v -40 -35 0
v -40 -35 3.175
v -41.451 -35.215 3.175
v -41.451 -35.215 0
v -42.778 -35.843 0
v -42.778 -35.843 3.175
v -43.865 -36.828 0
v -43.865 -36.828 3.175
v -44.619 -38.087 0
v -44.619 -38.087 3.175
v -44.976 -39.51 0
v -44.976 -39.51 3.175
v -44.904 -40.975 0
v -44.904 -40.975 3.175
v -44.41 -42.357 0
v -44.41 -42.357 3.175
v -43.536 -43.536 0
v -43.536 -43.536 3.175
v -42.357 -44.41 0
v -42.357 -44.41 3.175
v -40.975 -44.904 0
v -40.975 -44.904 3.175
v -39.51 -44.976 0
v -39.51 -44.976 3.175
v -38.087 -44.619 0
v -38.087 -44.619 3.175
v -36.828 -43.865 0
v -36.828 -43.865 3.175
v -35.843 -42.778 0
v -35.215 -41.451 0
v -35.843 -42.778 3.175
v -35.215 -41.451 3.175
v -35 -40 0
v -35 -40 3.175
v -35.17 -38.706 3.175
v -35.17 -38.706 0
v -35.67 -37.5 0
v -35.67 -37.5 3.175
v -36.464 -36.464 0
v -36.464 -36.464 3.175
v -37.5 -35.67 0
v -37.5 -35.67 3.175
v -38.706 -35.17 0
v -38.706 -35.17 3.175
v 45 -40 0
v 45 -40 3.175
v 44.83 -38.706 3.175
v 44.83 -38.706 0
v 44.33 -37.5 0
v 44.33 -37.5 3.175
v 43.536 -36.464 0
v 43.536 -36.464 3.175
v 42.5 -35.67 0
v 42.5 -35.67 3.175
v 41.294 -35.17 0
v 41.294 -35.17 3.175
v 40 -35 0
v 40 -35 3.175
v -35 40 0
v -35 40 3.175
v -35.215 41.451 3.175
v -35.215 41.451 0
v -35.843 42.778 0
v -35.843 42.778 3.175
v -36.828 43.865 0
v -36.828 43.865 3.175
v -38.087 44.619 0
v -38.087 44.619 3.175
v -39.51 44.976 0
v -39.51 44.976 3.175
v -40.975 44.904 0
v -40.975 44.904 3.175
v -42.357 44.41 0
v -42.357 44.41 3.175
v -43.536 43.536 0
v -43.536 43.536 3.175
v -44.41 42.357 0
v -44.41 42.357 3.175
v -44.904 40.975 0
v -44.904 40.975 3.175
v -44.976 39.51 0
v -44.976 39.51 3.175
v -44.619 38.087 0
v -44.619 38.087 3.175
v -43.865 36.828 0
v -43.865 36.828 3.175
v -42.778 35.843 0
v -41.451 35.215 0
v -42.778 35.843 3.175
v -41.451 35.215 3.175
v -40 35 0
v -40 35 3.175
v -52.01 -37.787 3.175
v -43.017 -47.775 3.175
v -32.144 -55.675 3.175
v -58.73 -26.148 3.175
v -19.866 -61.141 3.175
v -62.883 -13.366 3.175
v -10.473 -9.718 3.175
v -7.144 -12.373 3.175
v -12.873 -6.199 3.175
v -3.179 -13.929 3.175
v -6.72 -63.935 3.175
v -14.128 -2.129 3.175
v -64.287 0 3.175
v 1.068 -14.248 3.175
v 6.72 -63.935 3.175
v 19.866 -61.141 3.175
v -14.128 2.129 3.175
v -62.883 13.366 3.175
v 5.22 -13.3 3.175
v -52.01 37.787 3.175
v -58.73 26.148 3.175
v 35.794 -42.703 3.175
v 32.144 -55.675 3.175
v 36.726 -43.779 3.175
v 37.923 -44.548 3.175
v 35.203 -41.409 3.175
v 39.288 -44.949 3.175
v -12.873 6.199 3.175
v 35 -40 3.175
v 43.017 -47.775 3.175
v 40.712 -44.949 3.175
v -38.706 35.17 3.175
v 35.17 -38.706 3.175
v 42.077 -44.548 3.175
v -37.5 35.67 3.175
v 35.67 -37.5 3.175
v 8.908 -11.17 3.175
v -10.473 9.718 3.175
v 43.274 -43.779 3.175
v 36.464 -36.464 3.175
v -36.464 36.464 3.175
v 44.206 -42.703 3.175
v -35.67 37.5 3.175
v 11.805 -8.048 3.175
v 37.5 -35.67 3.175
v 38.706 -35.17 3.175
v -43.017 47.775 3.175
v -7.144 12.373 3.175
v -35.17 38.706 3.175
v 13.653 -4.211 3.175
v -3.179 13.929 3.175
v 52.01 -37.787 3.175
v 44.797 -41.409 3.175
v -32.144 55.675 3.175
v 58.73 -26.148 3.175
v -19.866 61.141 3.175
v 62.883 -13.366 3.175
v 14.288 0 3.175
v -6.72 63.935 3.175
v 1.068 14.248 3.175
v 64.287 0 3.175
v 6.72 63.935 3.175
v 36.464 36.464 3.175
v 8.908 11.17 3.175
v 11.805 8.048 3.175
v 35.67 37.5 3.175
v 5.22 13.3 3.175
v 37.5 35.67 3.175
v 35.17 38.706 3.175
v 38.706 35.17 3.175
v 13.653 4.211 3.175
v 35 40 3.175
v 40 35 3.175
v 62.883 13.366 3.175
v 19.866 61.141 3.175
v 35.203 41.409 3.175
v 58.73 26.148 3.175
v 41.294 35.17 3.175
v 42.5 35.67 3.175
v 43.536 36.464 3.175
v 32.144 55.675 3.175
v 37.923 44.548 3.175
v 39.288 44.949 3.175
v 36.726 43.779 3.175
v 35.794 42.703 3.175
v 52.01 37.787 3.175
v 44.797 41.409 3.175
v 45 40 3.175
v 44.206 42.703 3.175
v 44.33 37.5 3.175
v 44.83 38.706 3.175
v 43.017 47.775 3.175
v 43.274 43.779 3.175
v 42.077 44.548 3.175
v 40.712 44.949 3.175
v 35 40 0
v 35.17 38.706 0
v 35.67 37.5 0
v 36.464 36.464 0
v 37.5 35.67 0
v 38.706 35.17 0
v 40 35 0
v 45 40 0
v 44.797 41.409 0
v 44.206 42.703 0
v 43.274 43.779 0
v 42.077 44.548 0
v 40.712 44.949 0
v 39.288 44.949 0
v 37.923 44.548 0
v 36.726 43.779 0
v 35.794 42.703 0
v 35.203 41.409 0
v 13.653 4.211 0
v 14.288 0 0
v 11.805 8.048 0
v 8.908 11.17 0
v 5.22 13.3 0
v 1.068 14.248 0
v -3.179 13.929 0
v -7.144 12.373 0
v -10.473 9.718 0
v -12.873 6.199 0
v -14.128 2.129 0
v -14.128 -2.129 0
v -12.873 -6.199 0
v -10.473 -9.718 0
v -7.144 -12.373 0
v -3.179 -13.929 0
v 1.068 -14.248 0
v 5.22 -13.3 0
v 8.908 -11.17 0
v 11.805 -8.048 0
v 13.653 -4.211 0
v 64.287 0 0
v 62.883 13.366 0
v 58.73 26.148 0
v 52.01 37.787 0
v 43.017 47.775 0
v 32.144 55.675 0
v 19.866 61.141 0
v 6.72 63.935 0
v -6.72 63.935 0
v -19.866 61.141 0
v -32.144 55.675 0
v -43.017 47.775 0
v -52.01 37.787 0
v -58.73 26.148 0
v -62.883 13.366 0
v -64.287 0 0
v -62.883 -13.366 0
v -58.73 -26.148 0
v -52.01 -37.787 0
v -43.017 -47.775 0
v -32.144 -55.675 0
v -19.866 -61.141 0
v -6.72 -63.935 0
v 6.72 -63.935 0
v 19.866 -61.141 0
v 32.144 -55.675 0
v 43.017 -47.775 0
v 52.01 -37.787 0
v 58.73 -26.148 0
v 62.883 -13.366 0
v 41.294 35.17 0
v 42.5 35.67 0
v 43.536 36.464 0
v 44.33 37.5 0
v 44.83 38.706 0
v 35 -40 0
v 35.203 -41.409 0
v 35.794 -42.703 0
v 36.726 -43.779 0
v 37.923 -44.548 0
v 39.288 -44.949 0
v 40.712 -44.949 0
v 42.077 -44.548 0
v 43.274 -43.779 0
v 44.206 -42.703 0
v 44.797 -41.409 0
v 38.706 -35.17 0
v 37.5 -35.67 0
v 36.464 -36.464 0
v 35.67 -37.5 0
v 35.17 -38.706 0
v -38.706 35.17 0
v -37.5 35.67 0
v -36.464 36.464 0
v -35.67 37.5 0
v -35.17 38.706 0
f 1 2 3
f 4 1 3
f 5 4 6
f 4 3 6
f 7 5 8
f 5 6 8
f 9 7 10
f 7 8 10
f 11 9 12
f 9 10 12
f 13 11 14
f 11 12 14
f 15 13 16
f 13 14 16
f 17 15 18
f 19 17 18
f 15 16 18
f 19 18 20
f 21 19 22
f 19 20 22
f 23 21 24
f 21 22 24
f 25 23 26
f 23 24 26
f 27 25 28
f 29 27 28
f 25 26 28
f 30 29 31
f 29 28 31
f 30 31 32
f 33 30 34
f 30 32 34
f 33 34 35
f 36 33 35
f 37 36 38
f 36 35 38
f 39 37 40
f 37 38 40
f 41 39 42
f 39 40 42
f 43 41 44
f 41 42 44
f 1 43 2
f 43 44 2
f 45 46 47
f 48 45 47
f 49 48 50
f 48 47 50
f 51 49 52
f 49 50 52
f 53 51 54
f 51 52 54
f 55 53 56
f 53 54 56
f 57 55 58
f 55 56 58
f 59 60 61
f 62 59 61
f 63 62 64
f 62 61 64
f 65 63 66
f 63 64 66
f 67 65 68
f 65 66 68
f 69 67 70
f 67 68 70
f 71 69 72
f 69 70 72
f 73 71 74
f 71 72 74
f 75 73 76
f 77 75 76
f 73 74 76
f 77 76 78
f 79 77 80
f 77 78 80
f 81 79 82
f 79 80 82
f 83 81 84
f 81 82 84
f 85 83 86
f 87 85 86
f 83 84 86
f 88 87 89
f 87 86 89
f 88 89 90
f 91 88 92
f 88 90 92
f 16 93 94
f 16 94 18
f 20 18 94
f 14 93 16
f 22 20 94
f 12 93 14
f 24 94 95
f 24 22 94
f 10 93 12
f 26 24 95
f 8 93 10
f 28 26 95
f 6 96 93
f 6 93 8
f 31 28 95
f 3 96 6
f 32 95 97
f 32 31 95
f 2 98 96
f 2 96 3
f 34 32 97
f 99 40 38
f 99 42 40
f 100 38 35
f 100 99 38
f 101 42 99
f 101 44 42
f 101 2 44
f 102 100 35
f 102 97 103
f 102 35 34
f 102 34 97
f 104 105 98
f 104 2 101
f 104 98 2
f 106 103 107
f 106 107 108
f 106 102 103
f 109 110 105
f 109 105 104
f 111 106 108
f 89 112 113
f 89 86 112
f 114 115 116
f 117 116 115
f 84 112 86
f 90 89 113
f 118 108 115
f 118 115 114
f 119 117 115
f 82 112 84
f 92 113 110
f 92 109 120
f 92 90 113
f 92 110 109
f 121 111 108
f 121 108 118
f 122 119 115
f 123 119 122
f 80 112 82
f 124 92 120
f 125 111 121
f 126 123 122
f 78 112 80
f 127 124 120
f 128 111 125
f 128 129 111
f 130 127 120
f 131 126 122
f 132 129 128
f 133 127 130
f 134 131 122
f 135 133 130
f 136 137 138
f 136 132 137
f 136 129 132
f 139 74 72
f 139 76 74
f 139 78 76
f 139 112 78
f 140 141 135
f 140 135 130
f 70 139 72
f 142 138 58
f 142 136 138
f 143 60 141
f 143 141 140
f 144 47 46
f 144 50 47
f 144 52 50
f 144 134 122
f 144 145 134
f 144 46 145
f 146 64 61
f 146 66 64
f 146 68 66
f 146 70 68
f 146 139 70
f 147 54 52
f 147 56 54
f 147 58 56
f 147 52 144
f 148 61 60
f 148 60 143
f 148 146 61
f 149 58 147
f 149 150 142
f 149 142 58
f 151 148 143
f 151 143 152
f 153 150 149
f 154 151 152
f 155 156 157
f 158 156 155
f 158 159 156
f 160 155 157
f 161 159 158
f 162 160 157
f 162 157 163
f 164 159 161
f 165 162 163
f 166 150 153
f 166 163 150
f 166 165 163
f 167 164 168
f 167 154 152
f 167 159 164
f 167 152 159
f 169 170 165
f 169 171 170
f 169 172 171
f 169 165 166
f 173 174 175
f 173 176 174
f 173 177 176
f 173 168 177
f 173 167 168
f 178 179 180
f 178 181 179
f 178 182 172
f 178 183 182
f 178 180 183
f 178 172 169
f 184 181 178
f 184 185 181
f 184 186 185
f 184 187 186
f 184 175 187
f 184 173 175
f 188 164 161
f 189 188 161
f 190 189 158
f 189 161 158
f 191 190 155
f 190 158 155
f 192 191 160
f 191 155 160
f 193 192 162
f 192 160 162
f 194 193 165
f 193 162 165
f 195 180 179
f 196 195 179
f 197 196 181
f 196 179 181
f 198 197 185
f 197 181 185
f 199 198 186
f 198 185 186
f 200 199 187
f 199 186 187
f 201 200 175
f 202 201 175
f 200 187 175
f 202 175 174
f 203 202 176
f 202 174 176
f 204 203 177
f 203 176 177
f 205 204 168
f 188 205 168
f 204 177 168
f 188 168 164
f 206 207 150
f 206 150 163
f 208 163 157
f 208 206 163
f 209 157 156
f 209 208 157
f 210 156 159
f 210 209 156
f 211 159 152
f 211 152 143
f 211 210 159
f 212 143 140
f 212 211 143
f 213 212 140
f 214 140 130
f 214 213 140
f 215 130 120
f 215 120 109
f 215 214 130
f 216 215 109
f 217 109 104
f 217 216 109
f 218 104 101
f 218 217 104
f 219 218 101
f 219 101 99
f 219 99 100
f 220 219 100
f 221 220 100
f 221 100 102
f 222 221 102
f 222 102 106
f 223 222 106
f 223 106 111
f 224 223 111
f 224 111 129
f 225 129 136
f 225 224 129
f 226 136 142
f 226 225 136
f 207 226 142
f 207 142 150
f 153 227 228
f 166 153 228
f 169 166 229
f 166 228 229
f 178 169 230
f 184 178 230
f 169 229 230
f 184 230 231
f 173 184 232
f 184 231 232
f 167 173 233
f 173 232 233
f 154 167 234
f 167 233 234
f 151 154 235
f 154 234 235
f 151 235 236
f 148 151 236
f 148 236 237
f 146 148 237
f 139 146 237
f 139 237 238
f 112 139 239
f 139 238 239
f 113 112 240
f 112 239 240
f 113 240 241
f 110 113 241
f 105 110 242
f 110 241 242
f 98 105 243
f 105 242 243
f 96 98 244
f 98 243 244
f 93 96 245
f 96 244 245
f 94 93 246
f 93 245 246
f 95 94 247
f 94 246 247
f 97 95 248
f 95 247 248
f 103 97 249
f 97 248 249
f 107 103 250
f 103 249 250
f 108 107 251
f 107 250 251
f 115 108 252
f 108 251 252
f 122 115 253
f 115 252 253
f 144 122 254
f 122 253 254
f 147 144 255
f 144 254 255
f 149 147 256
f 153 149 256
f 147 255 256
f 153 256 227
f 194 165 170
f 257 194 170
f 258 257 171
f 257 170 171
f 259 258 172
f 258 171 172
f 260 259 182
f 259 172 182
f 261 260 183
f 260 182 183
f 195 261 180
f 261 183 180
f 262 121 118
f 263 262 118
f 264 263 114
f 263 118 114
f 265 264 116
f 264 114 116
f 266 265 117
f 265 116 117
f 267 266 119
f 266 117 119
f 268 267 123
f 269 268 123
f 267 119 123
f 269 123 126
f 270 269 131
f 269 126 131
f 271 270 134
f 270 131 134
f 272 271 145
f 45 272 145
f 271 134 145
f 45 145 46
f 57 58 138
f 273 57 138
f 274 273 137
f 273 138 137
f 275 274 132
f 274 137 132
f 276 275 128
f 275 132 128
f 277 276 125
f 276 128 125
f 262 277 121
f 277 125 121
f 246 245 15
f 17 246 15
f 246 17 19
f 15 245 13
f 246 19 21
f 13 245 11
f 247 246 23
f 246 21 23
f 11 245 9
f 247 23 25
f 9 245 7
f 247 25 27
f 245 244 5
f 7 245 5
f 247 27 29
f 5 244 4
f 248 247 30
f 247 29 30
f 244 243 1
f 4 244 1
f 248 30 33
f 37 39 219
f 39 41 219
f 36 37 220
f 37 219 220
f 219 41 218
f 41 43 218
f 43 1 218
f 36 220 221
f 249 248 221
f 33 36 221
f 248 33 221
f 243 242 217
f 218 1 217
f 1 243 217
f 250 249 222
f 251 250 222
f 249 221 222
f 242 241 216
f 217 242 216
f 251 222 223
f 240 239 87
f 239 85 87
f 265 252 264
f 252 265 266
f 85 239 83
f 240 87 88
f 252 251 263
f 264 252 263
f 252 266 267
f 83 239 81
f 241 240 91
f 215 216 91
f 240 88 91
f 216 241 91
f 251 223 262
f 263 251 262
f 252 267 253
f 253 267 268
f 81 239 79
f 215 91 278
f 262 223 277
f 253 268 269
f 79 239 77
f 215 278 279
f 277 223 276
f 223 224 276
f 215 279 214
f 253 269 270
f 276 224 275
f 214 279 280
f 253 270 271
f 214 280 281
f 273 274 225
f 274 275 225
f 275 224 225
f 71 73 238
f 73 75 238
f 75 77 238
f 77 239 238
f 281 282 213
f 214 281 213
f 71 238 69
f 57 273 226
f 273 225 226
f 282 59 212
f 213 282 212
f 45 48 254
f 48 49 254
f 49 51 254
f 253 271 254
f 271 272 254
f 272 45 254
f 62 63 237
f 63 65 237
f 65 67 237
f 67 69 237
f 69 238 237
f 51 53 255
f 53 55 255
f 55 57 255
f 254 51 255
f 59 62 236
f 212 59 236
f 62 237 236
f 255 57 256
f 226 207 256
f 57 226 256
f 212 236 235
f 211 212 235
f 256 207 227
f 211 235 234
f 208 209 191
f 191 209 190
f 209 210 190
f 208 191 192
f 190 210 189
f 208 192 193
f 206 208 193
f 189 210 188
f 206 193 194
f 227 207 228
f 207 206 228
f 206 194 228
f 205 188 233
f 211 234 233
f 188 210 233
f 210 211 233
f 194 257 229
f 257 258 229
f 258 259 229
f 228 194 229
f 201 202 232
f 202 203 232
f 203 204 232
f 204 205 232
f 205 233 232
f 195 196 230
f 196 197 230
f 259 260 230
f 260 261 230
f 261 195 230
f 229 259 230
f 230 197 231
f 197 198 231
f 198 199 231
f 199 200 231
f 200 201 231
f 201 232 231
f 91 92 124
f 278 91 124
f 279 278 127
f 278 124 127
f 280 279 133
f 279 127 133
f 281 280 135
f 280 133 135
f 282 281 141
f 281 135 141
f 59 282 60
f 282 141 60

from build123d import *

# Parameters (mm, degrees)
F0_R     = 64.2875
F0_R_2   = 14.2875
F1_DEPTH = 3.175
F3_DEPTH = 25


with BuildPart() as f1:
    # F0 (on Top) → F1 (new body)
    with BuildSketch(Plane.XY):
        Circle(F0_R)
        Circle(F0_R_2, mode=Mode.SUBTRACT)
    extrude(amount=F1_DEPTH)

    # F2 (on face) → F3 (cut)
    with BuildSketch(Plane.XY.offset(3.175)):
        with BuildLine():
            ThreePointArc((-40, 35), (-36.464466, 36.464466), (-35, 40))
            Line((-35, 40), (-40, 40))
            Line((-40, 40), (-40, 35))
        make_face()
        with BuildLine():
            Line((-40, 40), (-35, 40))
            ThreePointArc((-35, 40), (-43.535534, 43.535534), (-40, 35))
            Line((-40, 35), (-40, 40))
        make_face()
        with BuildLine():
            Line((40, 40), (35, 40))
            ThreePointArc((35, 40), (36.464466, 36.464466), (40, 35))
            Line((40, 35), (40, 40))
        make_face()
        with BuildLine():
            ThreePointArc((45, 40), (40, 45), (35, 40))
            Line((35, 40), (40, 40))
            Line((40, 40), (40, 35))
            ThreePointArc((40, 35), (43.535534, 36.464466), (45, 40))
        make_face()
        with BuildLine():
            ThreePointArc((45, -40), (43.535534, -36.464466), (40, -35))
            Line((40, -35), (40, -40))
            Line((40, -40), (35, -40))
            ThreePointArc((35, -40), (40, -45), (45, -40))
        make_face()
        with BuildLine():
            Line((40, -40), (40, -35))
            ThreePointArc((40, -35), (36.464466, -36.464466), (35, -40))
            Line((35, -40), (40, -40))
        make_face()
        with BuildLine():
            Line((-40, -40), (-40, -35))
            ThreePointArc((-40, -35), (-43.535534, -43.535534), (-35, -40))
            Line((-35, -40), (-40, -40))
        make_face()
        with BuildLine():
            ThreePointArc((-35, -40), (-36.464466, -36.464466), (-40, -35))
            Line((-40, -35), (-40, -40))
            Line((-40, -40), (-35, -40))
        make_face()
    extrude(amount=-F3_DEPTH, mode=Mode.SUBTRACT)


solid = f1.part
